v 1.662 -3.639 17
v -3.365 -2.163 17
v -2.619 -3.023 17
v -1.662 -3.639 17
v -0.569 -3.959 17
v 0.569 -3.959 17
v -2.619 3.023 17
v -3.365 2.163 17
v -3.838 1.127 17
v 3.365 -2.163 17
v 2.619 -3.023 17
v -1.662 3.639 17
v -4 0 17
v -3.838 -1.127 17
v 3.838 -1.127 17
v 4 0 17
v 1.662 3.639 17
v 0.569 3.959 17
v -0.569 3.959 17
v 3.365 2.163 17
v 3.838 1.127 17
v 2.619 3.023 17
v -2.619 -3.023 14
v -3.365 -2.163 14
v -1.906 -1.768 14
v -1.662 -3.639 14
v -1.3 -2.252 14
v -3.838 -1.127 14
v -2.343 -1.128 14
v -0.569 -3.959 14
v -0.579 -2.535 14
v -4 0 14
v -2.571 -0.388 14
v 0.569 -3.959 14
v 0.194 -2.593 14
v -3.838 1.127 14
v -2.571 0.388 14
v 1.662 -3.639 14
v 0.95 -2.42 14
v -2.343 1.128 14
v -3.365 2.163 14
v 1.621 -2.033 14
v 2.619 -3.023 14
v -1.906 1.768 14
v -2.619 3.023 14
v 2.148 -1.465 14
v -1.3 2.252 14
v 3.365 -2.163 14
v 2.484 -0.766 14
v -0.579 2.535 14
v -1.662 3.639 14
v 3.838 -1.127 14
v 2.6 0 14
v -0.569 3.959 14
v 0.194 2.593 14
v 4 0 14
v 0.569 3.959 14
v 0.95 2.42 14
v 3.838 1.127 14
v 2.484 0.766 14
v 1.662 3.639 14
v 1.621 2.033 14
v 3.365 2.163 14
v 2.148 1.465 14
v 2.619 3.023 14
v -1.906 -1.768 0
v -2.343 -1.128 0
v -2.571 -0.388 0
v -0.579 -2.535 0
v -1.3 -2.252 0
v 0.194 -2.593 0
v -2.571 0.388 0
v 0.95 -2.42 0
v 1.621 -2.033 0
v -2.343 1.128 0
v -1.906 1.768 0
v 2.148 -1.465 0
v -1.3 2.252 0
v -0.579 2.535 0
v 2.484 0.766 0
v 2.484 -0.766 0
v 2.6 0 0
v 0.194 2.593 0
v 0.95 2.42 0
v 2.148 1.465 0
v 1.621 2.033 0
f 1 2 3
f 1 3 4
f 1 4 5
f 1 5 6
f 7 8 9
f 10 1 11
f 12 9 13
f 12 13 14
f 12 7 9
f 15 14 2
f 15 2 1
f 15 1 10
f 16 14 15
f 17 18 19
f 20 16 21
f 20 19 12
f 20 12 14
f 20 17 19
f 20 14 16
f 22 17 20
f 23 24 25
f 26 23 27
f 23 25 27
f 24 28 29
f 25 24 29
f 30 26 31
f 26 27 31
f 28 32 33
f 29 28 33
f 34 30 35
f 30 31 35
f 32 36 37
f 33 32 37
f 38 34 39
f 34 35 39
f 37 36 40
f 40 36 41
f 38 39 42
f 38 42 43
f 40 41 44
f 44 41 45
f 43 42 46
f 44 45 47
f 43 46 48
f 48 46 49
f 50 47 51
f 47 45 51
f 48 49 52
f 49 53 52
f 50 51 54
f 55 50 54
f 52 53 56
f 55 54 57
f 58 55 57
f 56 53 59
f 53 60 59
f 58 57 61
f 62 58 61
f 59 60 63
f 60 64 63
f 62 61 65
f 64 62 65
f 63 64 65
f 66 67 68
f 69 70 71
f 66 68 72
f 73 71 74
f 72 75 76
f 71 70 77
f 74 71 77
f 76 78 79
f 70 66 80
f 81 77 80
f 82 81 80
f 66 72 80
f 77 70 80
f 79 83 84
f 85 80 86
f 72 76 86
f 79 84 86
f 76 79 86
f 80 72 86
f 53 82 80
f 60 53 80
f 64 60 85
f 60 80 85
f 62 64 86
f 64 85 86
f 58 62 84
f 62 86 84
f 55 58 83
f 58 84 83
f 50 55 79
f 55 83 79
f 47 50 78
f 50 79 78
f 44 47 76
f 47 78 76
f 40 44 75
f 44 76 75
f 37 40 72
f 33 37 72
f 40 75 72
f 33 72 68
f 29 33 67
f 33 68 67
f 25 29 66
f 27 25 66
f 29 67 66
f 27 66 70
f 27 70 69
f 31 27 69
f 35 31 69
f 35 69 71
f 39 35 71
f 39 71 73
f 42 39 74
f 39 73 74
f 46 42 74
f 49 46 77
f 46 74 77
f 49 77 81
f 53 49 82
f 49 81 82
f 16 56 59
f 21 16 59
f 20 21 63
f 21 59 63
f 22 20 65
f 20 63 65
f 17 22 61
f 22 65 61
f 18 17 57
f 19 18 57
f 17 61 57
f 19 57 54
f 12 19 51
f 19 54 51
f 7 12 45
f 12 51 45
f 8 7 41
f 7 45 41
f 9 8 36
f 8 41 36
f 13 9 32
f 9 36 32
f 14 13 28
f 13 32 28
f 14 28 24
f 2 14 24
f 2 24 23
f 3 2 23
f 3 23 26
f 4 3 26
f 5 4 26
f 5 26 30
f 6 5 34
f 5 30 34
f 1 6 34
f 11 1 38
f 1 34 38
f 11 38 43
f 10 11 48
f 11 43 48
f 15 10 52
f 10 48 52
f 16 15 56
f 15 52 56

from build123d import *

# Parameters (mm, degrees)
CYLINDER004_R     = 2.6
CYLINDER004_DEPTH = 14
CYLINDER003_R     = 4
CYLINDER003_DEPTH = 3


with BuildPart() as button_pusher:
    # Cylinder004 → Cylinder004 (new body)
    with BuildSketch(Plane.XY):
        Circle(CYLINDER004_R)
    extrude(amount=CYLINDER004_DEPTH)


with BuildPart() as button_pusher_fusion:
    # Cylinder003 → Cylinder003 (new body)
    with BuildSketch(Plane.XY.offset(14)):
        Circle(CYLINDER003_R)
    extrude(amount=CYLINDER003_DEPTH)

    # Fusion009: union button pusher
    add(button_pusher.part)


solid = button_pusher_fusion.part
